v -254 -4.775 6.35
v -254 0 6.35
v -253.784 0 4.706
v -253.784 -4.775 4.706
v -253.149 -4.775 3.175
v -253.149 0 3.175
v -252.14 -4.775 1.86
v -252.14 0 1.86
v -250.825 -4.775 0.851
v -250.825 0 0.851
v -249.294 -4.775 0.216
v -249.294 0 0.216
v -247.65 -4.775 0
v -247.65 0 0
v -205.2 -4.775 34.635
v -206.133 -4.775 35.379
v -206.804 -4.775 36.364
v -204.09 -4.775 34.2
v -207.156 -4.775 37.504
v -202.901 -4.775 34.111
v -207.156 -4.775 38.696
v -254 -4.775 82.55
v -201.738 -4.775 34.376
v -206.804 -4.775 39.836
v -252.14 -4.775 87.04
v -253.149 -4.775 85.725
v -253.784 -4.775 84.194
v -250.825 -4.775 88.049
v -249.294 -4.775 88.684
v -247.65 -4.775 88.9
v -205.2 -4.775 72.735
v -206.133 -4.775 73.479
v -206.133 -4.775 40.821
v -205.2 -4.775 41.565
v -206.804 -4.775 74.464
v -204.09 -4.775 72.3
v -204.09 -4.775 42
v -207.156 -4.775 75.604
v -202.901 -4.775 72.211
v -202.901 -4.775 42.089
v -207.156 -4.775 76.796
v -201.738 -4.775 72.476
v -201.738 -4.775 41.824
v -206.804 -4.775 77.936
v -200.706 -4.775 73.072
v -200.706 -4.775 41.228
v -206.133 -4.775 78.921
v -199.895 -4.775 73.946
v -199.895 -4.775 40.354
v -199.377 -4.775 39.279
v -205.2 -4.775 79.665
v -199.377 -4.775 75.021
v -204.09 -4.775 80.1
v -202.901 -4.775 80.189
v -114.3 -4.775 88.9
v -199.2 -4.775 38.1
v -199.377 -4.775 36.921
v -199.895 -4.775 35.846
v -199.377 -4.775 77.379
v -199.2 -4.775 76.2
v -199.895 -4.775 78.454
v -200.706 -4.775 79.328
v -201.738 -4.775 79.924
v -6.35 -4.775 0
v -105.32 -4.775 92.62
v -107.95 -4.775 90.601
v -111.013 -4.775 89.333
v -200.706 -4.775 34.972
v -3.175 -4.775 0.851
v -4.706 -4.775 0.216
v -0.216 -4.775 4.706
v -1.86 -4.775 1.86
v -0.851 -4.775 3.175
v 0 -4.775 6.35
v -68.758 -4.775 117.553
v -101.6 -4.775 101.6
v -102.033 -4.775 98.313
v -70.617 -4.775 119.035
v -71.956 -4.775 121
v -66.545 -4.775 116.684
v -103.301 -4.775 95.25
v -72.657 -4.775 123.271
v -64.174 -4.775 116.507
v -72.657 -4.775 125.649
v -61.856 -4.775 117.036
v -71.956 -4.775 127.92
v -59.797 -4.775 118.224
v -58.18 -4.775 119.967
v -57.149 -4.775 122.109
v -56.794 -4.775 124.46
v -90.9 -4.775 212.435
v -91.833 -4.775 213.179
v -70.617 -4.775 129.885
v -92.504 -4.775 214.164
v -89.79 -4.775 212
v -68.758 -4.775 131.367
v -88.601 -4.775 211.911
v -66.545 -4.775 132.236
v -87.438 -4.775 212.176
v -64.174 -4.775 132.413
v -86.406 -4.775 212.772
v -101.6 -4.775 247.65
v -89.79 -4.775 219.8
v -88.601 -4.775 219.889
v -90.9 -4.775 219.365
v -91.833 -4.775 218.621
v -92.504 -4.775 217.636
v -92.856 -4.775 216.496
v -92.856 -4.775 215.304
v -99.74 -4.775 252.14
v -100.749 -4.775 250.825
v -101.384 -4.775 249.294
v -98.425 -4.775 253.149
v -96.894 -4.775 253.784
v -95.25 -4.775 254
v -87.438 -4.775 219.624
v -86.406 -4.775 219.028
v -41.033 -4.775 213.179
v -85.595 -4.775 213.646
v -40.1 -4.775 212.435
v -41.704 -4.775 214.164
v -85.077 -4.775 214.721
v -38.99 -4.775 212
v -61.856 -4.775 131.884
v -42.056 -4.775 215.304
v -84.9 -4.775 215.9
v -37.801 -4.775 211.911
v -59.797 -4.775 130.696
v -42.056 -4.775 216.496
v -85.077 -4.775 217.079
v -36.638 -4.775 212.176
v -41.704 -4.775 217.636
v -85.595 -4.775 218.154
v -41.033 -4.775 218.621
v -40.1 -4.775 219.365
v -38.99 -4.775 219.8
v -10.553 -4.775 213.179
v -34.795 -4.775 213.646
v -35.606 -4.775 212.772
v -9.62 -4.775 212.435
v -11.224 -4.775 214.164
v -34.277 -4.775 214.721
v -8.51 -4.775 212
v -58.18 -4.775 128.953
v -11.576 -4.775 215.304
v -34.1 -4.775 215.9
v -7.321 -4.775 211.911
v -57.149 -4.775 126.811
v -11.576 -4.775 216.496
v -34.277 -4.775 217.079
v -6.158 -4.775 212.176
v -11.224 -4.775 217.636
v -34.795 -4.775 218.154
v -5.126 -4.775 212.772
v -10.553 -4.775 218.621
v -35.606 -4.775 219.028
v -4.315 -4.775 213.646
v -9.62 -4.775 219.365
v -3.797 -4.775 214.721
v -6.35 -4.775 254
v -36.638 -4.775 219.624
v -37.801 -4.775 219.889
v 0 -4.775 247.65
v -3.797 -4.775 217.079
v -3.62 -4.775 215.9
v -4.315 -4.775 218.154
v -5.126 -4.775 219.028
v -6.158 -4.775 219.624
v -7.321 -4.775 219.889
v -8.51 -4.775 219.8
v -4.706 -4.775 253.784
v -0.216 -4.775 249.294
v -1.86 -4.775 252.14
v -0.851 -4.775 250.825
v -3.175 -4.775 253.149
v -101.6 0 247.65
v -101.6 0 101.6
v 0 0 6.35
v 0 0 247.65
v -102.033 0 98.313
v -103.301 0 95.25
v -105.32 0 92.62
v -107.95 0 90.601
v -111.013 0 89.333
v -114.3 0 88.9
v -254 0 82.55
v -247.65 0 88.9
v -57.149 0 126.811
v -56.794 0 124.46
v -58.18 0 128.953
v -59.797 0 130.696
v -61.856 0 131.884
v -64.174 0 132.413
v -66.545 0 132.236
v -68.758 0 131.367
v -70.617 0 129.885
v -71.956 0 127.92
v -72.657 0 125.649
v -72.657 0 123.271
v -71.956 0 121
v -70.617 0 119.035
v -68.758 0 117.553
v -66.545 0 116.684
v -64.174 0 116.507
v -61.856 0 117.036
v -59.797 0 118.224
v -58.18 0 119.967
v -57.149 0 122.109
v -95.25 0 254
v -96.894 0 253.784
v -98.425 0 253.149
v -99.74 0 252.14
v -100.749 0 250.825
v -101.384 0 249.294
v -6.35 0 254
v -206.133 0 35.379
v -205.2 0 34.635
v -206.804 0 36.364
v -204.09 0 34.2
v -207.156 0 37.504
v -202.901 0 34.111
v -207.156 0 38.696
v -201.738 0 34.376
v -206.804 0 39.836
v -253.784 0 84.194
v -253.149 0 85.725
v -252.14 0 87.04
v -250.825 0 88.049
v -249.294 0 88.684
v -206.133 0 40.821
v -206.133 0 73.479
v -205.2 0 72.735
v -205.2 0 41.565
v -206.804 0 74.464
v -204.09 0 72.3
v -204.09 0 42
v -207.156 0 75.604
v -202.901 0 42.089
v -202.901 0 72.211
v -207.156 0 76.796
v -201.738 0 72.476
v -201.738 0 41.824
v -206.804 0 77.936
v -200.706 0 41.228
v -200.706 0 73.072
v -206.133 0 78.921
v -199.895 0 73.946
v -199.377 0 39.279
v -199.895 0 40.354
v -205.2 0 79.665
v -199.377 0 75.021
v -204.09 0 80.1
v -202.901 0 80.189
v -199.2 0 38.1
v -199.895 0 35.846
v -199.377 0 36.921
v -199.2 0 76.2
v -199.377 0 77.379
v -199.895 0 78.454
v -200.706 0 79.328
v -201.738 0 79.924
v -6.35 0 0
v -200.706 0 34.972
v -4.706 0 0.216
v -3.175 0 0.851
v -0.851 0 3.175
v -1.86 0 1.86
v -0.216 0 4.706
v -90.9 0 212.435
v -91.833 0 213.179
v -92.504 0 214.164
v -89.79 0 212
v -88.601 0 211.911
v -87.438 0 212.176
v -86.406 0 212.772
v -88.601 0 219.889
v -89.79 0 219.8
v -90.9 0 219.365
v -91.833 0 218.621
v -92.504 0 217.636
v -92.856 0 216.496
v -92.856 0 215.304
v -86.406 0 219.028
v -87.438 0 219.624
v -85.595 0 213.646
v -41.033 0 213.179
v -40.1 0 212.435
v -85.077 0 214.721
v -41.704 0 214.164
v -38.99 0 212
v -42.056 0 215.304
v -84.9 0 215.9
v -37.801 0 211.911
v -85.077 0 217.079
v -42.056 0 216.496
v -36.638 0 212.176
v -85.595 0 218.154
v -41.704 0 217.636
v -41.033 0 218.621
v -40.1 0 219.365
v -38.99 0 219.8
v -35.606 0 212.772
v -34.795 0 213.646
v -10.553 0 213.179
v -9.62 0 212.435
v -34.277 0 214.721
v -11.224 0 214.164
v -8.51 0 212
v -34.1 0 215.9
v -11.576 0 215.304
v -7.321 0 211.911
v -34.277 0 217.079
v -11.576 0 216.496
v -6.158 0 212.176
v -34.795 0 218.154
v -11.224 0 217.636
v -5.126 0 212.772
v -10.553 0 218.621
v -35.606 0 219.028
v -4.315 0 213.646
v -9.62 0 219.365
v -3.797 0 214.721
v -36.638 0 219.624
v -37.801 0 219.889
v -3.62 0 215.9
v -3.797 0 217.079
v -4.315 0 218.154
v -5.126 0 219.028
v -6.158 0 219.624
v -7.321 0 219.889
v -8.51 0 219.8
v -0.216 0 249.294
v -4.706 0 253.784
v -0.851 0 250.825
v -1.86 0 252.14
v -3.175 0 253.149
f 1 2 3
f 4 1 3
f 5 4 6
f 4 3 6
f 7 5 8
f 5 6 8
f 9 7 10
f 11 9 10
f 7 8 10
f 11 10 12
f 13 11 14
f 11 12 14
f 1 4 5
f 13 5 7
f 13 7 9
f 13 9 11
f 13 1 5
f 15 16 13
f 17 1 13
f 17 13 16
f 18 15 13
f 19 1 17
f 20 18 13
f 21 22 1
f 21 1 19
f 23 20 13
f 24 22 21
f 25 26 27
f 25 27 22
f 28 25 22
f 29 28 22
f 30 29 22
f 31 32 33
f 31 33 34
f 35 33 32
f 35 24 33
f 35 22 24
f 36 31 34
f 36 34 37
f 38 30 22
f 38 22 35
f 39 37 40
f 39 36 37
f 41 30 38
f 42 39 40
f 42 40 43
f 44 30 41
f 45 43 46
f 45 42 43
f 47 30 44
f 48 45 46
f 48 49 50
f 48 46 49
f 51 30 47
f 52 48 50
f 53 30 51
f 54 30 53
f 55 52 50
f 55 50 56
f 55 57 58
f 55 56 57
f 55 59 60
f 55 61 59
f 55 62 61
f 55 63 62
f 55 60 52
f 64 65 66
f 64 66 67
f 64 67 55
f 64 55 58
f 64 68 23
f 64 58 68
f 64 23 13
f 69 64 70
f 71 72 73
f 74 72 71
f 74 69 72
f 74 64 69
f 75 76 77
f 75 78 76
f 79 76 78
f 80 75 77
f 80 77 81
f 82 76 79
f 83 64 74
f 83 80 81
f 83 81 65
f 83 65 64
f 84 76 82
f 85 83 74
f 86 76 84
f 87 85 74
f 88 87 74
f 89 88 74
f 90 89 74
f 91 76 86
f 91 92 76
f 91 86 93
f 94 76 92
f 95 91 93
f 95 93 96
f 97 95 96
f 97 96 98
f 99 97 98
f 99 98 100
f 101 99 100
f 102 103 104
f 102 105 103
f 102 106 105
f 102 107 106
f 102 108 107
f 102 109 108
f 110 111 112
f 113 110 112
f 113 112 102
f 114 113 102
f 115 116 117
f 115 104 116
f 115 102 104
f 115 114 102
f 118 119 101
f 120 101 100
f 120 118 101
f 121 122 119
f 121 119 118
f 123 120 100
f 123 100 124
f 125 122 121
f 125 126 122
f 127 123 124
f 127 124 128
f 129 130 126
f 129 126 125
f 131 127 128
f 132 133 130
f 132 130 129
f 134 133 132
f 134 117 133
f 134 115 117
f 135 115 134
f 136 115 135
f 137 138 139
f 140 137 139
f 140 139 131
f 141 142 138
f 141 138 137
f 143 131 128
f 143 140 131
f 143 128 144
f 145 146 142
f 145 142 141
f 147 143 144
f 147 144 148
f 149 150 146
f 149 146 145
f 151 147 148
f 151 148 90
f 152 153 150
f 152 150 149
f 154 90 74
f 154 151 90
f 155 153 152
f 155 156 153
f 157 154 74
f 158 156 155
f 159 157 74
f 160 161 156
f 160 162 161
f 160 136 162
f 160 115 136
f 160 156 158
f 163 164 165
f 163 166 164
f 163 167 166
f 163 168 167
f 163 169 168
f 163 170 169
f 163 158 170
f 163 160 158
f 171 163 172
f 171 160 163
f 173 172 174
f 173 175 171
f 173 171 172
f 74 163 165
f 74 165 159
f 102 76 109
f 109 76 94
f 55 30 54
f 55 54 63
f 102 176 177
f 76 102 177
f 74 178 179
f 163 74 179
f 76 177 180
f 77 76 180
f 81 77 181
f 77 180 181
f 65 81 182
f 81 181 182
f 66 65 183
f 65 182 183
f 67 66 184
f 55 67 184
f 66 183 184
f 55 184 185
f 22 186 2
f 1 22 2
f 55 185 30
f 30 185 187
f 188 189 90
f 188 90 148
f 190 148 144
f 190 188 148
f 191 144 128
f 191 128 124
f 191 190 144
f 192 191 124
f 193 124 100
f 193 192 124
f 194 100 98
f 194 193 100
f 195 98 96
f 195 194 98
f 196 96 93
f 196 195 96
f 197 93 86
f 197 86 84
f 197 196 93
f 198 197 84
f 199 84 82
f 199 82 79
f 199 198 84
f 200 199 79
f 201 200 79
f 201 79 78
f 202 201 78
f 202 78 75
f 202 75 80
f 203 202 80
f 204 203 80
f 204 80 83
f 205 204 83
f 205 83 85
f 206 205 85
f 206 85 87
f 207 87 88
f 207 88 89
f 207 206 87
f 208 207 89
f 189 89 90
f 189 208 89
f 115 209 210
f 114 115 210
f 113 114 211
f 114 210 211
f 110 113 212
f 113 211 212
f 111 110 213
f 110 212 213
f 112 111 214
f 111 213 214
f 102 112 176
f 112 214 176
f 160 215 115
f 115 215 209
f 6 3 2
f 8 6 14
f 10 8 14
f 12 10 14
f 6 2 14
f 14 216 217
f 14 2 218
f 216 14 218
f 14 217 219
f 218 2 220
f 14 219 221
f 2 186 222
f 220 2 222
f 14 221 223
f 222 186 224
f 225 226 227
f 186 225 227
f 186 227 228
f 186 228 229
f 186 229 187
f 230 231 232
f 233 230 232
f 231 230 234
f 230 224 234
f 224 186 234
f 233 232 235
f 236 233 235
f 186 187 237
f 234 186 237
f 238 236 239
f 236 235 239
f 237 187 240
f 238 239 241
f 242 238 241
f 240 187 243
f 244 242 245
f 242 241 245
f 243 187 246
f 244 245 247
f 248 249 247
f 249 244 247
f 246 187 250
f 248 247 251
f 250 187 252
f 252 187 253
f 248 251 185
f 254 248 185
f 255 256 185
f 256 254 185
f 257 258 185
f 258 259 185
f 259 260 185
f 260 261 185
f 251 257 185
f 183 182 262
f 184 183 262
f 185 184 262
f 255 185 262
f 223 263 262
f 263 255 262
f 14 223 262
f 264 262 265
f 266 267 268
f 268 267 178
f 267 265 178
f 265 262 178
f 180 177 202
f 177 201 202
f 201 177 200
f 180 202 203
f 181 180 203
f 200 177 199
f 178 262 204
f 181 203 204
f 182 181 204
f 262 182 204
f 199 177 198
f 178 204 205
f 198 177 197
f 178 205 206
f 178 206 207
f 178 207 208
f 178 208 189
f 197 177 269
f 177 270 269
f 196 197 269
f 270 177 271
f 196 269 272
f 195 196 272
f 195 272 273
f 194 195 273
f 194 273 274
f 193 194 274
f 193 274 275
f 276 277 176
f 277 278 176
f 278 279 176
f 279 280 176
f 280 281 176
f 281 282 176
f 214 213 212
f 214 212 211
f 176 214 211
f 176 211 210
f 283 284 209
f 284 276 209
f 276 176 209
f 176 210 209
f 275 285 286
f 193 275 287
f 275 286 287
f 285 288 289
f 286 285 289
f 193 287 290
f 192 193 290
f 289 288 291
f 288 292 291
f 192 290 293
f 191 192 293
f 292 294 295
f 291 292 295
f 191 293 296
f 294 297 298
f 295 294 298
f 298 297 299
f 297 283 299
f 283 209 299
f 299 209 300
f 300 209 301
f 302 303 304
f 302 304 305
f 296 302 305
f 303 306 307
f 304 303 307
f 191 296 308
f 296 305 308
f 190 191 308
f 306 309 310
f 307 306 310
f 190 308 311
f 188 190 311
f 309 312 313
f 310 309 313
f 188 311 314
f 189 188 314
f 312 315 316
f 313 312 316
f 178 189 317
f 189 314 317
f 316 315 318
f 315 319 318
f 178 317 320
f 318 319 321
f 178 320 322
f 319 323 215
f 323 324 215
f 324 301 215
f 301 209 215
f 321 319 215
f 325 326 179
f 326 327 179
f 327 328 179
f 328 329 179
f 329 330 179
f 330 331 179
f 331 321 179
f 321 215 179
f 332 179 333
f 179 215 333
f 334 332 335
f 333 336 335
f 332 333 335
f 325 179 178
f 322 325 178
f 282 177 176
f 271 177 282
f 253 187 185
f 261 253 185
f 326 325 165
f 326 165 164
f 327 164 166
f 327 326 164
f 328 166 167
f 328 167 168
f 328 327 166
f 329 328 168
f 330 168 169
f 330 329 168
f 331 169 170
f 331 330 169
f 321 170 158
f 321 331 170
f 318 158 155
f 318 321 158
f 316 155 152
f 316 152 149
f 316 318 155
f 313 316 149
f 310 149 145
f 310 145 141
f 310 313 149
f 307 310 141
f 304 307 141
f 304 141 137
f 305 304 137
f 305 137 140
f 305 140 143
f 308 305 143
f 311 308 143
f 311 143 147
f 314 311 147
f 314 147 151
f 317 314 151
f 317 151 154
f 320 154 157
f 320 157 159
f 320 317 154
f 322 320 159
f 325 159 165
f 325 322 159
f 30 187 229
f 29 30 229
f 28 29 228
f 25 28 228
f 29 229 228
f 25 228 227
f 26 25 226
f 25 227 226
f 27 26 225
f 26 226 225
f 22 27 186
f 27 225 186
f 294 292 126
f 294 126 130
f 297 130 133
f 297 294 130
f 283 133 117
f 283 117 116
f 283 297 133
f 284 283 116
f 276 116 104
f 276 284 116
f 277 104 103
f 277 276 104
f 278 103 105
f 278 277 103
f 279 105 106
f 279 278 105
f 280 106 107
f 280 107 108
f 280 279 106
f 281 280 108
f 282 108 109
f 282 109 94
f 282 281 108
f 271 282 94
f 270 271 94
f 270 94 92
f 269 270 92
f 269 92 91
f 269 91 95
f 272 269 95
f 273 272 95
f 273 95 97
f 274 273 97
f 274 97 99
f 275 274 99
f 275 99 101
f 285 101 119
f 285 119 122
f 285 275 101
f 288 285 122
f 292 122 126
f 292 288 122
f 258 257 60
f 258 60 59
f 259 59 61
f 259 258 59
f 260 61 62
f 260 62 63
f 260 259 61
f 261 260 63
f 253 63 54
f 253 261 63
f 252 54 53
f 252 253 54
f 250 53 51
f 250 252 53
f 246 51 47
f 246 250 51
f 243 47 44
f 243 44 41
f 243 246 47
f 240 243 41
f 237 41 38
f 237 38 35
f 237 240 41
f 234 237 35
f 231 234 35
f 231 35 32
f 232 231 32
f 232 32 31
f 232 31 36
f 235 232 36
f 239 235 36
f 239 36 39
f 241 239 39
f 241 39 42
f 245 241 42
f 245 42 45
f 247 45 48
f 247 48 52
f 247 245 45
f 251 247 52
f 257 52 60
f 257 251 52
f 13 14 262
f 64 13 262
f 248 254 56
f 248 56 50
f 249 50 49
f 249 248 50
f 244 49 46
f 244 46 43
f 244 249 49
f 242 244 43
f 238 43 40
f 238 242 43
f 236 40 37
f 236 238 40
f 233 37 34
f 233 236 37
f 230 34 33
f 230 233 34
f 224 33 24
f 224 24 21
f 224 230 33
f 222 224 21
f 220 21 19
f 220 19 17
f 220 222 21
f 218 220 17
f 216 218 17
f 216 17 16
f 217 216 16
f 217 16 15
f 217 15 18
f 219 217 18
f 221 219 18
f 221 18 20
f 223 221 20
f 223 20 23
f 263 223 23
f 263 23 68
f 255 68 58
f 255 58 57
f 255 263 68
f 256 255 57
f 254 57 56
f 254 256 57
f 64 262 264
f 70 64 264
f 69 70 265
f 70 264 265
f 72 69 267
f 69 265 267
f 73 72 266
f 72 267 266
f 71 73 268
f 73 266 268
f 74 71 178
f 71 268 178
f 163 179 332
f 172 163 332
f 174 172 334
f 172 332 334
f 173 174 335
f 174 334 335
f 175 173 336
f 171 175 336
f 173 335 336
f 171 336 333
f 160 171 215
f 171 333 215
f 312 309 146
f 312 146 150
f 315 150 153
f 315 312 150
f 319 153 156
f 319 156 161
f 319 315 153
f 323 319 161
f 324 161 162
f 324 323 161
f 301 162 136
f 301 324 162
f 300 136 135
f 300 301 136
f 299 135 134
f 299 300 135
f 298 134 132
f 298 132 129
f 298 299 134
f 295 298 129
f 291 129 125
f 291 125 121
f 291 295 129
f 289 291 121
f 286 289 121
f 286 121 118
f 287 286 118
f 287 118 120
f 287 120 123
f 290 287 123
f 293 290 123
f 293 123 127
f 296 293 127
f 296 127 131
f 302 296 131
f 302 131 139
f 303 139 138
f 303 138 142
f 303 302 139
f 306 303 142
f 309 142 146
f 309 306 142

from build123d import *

# Parameters (mm, degrees)
F0_R     = 4.0005
F0_R_2   = 9.525
F0_R_3   = 7.9756
F1_DEPTH = 4.7752


with BuildPart() as f1:
    # F0 (on Front) → F1 (new body)
    with BuildSketch(Plane.XZ):
        with BuildLine():
            ThreePointArc((-6.35, 0), (-1.859872, 1.859872), (0, 6.35))
            Line((0, 6.35), (0, 247.65))
            ThreePointArc((0, 247.65), (-1.859872, 252.140128), (-6.35, 254))
            Line((-6.35, 254), (-95.25, 254))
            ThreePointArc((-95.25, 254), (-99.740128, 252.140128), (-101.6, 247.65))
            Line((-101.6, 247.65), (-101.6, 176.188146))
            ThreePointArc((-101.6, 176.188146), (-35.670644, 180.900035), (-1.27, 124.46))
            ThreePointArc((-1.27, 124.46), (-46.17483, 63.743695), (-117.379281, 88.9))
            Line((-117.379281, 88.9), (-247.65, 88.9))
            ThreePointArc((-247.65, 88.9), (-252.140128, 87.040128), (-254, 82.55))
            Line((-254, 82.55), (-254, 6.35))
            ThreePointArc((-254, 6.35), (-252.140128, 1.859872), (-247.65, 0))
            Line((-247.65, 0), (-6.35, 0))
        make_face()
        with Locations((-203.2, 38.1)):
            Circle(F0_R, mode=Mode.SUBTRACT)
        with Locations((-203.2, 76.2)):
            Circle(F0_R, mode=Mode.SUBTRACT)
        with Locations((-33.35242, 48.26)):
            Circle(F0_R_2, mode=Mode.SUBTRACT)
        with Locations((-88.9, 215.9)):
            Circle(F0_R, mode=Mode.SUBTRACT)
        with Locations((-38.1, 215.9)):
            Circle(F0_R, mode=Mode.SUBTRACT)
        with Locations((-7.62, 215.9)):
            Circle(F0_R, mode=Mode.SUBTRACT)
        with Locations((-33.35242, 48.26)):
            Circle(F0_R_2)
        with BuildLine():
            ThreePointArc((-1.27, 124.46), (-35.670644, 180.900035), (-101.6, 176.188146))
            Line((-101.6, 176.188146), (-101.6, 101.6))
            ThreePointArc((-101.6, 101.6), (-105.319744, 92.619744), (-114.3, 88.9))
            Line((-114.3, 88.9), (-117.379281, 88.9))
            ThreePointArc((-117.379281, 88.9), (-46.17483, 63.743695), (-1.27, 124.46))
        make_face()
        with Locations((-64.77, 124.46)):
            Circle(F0_R_3, mode=Mode.SUBTRACT)
    extrude(amount=F1_DEPTH)


solid = f1.part
